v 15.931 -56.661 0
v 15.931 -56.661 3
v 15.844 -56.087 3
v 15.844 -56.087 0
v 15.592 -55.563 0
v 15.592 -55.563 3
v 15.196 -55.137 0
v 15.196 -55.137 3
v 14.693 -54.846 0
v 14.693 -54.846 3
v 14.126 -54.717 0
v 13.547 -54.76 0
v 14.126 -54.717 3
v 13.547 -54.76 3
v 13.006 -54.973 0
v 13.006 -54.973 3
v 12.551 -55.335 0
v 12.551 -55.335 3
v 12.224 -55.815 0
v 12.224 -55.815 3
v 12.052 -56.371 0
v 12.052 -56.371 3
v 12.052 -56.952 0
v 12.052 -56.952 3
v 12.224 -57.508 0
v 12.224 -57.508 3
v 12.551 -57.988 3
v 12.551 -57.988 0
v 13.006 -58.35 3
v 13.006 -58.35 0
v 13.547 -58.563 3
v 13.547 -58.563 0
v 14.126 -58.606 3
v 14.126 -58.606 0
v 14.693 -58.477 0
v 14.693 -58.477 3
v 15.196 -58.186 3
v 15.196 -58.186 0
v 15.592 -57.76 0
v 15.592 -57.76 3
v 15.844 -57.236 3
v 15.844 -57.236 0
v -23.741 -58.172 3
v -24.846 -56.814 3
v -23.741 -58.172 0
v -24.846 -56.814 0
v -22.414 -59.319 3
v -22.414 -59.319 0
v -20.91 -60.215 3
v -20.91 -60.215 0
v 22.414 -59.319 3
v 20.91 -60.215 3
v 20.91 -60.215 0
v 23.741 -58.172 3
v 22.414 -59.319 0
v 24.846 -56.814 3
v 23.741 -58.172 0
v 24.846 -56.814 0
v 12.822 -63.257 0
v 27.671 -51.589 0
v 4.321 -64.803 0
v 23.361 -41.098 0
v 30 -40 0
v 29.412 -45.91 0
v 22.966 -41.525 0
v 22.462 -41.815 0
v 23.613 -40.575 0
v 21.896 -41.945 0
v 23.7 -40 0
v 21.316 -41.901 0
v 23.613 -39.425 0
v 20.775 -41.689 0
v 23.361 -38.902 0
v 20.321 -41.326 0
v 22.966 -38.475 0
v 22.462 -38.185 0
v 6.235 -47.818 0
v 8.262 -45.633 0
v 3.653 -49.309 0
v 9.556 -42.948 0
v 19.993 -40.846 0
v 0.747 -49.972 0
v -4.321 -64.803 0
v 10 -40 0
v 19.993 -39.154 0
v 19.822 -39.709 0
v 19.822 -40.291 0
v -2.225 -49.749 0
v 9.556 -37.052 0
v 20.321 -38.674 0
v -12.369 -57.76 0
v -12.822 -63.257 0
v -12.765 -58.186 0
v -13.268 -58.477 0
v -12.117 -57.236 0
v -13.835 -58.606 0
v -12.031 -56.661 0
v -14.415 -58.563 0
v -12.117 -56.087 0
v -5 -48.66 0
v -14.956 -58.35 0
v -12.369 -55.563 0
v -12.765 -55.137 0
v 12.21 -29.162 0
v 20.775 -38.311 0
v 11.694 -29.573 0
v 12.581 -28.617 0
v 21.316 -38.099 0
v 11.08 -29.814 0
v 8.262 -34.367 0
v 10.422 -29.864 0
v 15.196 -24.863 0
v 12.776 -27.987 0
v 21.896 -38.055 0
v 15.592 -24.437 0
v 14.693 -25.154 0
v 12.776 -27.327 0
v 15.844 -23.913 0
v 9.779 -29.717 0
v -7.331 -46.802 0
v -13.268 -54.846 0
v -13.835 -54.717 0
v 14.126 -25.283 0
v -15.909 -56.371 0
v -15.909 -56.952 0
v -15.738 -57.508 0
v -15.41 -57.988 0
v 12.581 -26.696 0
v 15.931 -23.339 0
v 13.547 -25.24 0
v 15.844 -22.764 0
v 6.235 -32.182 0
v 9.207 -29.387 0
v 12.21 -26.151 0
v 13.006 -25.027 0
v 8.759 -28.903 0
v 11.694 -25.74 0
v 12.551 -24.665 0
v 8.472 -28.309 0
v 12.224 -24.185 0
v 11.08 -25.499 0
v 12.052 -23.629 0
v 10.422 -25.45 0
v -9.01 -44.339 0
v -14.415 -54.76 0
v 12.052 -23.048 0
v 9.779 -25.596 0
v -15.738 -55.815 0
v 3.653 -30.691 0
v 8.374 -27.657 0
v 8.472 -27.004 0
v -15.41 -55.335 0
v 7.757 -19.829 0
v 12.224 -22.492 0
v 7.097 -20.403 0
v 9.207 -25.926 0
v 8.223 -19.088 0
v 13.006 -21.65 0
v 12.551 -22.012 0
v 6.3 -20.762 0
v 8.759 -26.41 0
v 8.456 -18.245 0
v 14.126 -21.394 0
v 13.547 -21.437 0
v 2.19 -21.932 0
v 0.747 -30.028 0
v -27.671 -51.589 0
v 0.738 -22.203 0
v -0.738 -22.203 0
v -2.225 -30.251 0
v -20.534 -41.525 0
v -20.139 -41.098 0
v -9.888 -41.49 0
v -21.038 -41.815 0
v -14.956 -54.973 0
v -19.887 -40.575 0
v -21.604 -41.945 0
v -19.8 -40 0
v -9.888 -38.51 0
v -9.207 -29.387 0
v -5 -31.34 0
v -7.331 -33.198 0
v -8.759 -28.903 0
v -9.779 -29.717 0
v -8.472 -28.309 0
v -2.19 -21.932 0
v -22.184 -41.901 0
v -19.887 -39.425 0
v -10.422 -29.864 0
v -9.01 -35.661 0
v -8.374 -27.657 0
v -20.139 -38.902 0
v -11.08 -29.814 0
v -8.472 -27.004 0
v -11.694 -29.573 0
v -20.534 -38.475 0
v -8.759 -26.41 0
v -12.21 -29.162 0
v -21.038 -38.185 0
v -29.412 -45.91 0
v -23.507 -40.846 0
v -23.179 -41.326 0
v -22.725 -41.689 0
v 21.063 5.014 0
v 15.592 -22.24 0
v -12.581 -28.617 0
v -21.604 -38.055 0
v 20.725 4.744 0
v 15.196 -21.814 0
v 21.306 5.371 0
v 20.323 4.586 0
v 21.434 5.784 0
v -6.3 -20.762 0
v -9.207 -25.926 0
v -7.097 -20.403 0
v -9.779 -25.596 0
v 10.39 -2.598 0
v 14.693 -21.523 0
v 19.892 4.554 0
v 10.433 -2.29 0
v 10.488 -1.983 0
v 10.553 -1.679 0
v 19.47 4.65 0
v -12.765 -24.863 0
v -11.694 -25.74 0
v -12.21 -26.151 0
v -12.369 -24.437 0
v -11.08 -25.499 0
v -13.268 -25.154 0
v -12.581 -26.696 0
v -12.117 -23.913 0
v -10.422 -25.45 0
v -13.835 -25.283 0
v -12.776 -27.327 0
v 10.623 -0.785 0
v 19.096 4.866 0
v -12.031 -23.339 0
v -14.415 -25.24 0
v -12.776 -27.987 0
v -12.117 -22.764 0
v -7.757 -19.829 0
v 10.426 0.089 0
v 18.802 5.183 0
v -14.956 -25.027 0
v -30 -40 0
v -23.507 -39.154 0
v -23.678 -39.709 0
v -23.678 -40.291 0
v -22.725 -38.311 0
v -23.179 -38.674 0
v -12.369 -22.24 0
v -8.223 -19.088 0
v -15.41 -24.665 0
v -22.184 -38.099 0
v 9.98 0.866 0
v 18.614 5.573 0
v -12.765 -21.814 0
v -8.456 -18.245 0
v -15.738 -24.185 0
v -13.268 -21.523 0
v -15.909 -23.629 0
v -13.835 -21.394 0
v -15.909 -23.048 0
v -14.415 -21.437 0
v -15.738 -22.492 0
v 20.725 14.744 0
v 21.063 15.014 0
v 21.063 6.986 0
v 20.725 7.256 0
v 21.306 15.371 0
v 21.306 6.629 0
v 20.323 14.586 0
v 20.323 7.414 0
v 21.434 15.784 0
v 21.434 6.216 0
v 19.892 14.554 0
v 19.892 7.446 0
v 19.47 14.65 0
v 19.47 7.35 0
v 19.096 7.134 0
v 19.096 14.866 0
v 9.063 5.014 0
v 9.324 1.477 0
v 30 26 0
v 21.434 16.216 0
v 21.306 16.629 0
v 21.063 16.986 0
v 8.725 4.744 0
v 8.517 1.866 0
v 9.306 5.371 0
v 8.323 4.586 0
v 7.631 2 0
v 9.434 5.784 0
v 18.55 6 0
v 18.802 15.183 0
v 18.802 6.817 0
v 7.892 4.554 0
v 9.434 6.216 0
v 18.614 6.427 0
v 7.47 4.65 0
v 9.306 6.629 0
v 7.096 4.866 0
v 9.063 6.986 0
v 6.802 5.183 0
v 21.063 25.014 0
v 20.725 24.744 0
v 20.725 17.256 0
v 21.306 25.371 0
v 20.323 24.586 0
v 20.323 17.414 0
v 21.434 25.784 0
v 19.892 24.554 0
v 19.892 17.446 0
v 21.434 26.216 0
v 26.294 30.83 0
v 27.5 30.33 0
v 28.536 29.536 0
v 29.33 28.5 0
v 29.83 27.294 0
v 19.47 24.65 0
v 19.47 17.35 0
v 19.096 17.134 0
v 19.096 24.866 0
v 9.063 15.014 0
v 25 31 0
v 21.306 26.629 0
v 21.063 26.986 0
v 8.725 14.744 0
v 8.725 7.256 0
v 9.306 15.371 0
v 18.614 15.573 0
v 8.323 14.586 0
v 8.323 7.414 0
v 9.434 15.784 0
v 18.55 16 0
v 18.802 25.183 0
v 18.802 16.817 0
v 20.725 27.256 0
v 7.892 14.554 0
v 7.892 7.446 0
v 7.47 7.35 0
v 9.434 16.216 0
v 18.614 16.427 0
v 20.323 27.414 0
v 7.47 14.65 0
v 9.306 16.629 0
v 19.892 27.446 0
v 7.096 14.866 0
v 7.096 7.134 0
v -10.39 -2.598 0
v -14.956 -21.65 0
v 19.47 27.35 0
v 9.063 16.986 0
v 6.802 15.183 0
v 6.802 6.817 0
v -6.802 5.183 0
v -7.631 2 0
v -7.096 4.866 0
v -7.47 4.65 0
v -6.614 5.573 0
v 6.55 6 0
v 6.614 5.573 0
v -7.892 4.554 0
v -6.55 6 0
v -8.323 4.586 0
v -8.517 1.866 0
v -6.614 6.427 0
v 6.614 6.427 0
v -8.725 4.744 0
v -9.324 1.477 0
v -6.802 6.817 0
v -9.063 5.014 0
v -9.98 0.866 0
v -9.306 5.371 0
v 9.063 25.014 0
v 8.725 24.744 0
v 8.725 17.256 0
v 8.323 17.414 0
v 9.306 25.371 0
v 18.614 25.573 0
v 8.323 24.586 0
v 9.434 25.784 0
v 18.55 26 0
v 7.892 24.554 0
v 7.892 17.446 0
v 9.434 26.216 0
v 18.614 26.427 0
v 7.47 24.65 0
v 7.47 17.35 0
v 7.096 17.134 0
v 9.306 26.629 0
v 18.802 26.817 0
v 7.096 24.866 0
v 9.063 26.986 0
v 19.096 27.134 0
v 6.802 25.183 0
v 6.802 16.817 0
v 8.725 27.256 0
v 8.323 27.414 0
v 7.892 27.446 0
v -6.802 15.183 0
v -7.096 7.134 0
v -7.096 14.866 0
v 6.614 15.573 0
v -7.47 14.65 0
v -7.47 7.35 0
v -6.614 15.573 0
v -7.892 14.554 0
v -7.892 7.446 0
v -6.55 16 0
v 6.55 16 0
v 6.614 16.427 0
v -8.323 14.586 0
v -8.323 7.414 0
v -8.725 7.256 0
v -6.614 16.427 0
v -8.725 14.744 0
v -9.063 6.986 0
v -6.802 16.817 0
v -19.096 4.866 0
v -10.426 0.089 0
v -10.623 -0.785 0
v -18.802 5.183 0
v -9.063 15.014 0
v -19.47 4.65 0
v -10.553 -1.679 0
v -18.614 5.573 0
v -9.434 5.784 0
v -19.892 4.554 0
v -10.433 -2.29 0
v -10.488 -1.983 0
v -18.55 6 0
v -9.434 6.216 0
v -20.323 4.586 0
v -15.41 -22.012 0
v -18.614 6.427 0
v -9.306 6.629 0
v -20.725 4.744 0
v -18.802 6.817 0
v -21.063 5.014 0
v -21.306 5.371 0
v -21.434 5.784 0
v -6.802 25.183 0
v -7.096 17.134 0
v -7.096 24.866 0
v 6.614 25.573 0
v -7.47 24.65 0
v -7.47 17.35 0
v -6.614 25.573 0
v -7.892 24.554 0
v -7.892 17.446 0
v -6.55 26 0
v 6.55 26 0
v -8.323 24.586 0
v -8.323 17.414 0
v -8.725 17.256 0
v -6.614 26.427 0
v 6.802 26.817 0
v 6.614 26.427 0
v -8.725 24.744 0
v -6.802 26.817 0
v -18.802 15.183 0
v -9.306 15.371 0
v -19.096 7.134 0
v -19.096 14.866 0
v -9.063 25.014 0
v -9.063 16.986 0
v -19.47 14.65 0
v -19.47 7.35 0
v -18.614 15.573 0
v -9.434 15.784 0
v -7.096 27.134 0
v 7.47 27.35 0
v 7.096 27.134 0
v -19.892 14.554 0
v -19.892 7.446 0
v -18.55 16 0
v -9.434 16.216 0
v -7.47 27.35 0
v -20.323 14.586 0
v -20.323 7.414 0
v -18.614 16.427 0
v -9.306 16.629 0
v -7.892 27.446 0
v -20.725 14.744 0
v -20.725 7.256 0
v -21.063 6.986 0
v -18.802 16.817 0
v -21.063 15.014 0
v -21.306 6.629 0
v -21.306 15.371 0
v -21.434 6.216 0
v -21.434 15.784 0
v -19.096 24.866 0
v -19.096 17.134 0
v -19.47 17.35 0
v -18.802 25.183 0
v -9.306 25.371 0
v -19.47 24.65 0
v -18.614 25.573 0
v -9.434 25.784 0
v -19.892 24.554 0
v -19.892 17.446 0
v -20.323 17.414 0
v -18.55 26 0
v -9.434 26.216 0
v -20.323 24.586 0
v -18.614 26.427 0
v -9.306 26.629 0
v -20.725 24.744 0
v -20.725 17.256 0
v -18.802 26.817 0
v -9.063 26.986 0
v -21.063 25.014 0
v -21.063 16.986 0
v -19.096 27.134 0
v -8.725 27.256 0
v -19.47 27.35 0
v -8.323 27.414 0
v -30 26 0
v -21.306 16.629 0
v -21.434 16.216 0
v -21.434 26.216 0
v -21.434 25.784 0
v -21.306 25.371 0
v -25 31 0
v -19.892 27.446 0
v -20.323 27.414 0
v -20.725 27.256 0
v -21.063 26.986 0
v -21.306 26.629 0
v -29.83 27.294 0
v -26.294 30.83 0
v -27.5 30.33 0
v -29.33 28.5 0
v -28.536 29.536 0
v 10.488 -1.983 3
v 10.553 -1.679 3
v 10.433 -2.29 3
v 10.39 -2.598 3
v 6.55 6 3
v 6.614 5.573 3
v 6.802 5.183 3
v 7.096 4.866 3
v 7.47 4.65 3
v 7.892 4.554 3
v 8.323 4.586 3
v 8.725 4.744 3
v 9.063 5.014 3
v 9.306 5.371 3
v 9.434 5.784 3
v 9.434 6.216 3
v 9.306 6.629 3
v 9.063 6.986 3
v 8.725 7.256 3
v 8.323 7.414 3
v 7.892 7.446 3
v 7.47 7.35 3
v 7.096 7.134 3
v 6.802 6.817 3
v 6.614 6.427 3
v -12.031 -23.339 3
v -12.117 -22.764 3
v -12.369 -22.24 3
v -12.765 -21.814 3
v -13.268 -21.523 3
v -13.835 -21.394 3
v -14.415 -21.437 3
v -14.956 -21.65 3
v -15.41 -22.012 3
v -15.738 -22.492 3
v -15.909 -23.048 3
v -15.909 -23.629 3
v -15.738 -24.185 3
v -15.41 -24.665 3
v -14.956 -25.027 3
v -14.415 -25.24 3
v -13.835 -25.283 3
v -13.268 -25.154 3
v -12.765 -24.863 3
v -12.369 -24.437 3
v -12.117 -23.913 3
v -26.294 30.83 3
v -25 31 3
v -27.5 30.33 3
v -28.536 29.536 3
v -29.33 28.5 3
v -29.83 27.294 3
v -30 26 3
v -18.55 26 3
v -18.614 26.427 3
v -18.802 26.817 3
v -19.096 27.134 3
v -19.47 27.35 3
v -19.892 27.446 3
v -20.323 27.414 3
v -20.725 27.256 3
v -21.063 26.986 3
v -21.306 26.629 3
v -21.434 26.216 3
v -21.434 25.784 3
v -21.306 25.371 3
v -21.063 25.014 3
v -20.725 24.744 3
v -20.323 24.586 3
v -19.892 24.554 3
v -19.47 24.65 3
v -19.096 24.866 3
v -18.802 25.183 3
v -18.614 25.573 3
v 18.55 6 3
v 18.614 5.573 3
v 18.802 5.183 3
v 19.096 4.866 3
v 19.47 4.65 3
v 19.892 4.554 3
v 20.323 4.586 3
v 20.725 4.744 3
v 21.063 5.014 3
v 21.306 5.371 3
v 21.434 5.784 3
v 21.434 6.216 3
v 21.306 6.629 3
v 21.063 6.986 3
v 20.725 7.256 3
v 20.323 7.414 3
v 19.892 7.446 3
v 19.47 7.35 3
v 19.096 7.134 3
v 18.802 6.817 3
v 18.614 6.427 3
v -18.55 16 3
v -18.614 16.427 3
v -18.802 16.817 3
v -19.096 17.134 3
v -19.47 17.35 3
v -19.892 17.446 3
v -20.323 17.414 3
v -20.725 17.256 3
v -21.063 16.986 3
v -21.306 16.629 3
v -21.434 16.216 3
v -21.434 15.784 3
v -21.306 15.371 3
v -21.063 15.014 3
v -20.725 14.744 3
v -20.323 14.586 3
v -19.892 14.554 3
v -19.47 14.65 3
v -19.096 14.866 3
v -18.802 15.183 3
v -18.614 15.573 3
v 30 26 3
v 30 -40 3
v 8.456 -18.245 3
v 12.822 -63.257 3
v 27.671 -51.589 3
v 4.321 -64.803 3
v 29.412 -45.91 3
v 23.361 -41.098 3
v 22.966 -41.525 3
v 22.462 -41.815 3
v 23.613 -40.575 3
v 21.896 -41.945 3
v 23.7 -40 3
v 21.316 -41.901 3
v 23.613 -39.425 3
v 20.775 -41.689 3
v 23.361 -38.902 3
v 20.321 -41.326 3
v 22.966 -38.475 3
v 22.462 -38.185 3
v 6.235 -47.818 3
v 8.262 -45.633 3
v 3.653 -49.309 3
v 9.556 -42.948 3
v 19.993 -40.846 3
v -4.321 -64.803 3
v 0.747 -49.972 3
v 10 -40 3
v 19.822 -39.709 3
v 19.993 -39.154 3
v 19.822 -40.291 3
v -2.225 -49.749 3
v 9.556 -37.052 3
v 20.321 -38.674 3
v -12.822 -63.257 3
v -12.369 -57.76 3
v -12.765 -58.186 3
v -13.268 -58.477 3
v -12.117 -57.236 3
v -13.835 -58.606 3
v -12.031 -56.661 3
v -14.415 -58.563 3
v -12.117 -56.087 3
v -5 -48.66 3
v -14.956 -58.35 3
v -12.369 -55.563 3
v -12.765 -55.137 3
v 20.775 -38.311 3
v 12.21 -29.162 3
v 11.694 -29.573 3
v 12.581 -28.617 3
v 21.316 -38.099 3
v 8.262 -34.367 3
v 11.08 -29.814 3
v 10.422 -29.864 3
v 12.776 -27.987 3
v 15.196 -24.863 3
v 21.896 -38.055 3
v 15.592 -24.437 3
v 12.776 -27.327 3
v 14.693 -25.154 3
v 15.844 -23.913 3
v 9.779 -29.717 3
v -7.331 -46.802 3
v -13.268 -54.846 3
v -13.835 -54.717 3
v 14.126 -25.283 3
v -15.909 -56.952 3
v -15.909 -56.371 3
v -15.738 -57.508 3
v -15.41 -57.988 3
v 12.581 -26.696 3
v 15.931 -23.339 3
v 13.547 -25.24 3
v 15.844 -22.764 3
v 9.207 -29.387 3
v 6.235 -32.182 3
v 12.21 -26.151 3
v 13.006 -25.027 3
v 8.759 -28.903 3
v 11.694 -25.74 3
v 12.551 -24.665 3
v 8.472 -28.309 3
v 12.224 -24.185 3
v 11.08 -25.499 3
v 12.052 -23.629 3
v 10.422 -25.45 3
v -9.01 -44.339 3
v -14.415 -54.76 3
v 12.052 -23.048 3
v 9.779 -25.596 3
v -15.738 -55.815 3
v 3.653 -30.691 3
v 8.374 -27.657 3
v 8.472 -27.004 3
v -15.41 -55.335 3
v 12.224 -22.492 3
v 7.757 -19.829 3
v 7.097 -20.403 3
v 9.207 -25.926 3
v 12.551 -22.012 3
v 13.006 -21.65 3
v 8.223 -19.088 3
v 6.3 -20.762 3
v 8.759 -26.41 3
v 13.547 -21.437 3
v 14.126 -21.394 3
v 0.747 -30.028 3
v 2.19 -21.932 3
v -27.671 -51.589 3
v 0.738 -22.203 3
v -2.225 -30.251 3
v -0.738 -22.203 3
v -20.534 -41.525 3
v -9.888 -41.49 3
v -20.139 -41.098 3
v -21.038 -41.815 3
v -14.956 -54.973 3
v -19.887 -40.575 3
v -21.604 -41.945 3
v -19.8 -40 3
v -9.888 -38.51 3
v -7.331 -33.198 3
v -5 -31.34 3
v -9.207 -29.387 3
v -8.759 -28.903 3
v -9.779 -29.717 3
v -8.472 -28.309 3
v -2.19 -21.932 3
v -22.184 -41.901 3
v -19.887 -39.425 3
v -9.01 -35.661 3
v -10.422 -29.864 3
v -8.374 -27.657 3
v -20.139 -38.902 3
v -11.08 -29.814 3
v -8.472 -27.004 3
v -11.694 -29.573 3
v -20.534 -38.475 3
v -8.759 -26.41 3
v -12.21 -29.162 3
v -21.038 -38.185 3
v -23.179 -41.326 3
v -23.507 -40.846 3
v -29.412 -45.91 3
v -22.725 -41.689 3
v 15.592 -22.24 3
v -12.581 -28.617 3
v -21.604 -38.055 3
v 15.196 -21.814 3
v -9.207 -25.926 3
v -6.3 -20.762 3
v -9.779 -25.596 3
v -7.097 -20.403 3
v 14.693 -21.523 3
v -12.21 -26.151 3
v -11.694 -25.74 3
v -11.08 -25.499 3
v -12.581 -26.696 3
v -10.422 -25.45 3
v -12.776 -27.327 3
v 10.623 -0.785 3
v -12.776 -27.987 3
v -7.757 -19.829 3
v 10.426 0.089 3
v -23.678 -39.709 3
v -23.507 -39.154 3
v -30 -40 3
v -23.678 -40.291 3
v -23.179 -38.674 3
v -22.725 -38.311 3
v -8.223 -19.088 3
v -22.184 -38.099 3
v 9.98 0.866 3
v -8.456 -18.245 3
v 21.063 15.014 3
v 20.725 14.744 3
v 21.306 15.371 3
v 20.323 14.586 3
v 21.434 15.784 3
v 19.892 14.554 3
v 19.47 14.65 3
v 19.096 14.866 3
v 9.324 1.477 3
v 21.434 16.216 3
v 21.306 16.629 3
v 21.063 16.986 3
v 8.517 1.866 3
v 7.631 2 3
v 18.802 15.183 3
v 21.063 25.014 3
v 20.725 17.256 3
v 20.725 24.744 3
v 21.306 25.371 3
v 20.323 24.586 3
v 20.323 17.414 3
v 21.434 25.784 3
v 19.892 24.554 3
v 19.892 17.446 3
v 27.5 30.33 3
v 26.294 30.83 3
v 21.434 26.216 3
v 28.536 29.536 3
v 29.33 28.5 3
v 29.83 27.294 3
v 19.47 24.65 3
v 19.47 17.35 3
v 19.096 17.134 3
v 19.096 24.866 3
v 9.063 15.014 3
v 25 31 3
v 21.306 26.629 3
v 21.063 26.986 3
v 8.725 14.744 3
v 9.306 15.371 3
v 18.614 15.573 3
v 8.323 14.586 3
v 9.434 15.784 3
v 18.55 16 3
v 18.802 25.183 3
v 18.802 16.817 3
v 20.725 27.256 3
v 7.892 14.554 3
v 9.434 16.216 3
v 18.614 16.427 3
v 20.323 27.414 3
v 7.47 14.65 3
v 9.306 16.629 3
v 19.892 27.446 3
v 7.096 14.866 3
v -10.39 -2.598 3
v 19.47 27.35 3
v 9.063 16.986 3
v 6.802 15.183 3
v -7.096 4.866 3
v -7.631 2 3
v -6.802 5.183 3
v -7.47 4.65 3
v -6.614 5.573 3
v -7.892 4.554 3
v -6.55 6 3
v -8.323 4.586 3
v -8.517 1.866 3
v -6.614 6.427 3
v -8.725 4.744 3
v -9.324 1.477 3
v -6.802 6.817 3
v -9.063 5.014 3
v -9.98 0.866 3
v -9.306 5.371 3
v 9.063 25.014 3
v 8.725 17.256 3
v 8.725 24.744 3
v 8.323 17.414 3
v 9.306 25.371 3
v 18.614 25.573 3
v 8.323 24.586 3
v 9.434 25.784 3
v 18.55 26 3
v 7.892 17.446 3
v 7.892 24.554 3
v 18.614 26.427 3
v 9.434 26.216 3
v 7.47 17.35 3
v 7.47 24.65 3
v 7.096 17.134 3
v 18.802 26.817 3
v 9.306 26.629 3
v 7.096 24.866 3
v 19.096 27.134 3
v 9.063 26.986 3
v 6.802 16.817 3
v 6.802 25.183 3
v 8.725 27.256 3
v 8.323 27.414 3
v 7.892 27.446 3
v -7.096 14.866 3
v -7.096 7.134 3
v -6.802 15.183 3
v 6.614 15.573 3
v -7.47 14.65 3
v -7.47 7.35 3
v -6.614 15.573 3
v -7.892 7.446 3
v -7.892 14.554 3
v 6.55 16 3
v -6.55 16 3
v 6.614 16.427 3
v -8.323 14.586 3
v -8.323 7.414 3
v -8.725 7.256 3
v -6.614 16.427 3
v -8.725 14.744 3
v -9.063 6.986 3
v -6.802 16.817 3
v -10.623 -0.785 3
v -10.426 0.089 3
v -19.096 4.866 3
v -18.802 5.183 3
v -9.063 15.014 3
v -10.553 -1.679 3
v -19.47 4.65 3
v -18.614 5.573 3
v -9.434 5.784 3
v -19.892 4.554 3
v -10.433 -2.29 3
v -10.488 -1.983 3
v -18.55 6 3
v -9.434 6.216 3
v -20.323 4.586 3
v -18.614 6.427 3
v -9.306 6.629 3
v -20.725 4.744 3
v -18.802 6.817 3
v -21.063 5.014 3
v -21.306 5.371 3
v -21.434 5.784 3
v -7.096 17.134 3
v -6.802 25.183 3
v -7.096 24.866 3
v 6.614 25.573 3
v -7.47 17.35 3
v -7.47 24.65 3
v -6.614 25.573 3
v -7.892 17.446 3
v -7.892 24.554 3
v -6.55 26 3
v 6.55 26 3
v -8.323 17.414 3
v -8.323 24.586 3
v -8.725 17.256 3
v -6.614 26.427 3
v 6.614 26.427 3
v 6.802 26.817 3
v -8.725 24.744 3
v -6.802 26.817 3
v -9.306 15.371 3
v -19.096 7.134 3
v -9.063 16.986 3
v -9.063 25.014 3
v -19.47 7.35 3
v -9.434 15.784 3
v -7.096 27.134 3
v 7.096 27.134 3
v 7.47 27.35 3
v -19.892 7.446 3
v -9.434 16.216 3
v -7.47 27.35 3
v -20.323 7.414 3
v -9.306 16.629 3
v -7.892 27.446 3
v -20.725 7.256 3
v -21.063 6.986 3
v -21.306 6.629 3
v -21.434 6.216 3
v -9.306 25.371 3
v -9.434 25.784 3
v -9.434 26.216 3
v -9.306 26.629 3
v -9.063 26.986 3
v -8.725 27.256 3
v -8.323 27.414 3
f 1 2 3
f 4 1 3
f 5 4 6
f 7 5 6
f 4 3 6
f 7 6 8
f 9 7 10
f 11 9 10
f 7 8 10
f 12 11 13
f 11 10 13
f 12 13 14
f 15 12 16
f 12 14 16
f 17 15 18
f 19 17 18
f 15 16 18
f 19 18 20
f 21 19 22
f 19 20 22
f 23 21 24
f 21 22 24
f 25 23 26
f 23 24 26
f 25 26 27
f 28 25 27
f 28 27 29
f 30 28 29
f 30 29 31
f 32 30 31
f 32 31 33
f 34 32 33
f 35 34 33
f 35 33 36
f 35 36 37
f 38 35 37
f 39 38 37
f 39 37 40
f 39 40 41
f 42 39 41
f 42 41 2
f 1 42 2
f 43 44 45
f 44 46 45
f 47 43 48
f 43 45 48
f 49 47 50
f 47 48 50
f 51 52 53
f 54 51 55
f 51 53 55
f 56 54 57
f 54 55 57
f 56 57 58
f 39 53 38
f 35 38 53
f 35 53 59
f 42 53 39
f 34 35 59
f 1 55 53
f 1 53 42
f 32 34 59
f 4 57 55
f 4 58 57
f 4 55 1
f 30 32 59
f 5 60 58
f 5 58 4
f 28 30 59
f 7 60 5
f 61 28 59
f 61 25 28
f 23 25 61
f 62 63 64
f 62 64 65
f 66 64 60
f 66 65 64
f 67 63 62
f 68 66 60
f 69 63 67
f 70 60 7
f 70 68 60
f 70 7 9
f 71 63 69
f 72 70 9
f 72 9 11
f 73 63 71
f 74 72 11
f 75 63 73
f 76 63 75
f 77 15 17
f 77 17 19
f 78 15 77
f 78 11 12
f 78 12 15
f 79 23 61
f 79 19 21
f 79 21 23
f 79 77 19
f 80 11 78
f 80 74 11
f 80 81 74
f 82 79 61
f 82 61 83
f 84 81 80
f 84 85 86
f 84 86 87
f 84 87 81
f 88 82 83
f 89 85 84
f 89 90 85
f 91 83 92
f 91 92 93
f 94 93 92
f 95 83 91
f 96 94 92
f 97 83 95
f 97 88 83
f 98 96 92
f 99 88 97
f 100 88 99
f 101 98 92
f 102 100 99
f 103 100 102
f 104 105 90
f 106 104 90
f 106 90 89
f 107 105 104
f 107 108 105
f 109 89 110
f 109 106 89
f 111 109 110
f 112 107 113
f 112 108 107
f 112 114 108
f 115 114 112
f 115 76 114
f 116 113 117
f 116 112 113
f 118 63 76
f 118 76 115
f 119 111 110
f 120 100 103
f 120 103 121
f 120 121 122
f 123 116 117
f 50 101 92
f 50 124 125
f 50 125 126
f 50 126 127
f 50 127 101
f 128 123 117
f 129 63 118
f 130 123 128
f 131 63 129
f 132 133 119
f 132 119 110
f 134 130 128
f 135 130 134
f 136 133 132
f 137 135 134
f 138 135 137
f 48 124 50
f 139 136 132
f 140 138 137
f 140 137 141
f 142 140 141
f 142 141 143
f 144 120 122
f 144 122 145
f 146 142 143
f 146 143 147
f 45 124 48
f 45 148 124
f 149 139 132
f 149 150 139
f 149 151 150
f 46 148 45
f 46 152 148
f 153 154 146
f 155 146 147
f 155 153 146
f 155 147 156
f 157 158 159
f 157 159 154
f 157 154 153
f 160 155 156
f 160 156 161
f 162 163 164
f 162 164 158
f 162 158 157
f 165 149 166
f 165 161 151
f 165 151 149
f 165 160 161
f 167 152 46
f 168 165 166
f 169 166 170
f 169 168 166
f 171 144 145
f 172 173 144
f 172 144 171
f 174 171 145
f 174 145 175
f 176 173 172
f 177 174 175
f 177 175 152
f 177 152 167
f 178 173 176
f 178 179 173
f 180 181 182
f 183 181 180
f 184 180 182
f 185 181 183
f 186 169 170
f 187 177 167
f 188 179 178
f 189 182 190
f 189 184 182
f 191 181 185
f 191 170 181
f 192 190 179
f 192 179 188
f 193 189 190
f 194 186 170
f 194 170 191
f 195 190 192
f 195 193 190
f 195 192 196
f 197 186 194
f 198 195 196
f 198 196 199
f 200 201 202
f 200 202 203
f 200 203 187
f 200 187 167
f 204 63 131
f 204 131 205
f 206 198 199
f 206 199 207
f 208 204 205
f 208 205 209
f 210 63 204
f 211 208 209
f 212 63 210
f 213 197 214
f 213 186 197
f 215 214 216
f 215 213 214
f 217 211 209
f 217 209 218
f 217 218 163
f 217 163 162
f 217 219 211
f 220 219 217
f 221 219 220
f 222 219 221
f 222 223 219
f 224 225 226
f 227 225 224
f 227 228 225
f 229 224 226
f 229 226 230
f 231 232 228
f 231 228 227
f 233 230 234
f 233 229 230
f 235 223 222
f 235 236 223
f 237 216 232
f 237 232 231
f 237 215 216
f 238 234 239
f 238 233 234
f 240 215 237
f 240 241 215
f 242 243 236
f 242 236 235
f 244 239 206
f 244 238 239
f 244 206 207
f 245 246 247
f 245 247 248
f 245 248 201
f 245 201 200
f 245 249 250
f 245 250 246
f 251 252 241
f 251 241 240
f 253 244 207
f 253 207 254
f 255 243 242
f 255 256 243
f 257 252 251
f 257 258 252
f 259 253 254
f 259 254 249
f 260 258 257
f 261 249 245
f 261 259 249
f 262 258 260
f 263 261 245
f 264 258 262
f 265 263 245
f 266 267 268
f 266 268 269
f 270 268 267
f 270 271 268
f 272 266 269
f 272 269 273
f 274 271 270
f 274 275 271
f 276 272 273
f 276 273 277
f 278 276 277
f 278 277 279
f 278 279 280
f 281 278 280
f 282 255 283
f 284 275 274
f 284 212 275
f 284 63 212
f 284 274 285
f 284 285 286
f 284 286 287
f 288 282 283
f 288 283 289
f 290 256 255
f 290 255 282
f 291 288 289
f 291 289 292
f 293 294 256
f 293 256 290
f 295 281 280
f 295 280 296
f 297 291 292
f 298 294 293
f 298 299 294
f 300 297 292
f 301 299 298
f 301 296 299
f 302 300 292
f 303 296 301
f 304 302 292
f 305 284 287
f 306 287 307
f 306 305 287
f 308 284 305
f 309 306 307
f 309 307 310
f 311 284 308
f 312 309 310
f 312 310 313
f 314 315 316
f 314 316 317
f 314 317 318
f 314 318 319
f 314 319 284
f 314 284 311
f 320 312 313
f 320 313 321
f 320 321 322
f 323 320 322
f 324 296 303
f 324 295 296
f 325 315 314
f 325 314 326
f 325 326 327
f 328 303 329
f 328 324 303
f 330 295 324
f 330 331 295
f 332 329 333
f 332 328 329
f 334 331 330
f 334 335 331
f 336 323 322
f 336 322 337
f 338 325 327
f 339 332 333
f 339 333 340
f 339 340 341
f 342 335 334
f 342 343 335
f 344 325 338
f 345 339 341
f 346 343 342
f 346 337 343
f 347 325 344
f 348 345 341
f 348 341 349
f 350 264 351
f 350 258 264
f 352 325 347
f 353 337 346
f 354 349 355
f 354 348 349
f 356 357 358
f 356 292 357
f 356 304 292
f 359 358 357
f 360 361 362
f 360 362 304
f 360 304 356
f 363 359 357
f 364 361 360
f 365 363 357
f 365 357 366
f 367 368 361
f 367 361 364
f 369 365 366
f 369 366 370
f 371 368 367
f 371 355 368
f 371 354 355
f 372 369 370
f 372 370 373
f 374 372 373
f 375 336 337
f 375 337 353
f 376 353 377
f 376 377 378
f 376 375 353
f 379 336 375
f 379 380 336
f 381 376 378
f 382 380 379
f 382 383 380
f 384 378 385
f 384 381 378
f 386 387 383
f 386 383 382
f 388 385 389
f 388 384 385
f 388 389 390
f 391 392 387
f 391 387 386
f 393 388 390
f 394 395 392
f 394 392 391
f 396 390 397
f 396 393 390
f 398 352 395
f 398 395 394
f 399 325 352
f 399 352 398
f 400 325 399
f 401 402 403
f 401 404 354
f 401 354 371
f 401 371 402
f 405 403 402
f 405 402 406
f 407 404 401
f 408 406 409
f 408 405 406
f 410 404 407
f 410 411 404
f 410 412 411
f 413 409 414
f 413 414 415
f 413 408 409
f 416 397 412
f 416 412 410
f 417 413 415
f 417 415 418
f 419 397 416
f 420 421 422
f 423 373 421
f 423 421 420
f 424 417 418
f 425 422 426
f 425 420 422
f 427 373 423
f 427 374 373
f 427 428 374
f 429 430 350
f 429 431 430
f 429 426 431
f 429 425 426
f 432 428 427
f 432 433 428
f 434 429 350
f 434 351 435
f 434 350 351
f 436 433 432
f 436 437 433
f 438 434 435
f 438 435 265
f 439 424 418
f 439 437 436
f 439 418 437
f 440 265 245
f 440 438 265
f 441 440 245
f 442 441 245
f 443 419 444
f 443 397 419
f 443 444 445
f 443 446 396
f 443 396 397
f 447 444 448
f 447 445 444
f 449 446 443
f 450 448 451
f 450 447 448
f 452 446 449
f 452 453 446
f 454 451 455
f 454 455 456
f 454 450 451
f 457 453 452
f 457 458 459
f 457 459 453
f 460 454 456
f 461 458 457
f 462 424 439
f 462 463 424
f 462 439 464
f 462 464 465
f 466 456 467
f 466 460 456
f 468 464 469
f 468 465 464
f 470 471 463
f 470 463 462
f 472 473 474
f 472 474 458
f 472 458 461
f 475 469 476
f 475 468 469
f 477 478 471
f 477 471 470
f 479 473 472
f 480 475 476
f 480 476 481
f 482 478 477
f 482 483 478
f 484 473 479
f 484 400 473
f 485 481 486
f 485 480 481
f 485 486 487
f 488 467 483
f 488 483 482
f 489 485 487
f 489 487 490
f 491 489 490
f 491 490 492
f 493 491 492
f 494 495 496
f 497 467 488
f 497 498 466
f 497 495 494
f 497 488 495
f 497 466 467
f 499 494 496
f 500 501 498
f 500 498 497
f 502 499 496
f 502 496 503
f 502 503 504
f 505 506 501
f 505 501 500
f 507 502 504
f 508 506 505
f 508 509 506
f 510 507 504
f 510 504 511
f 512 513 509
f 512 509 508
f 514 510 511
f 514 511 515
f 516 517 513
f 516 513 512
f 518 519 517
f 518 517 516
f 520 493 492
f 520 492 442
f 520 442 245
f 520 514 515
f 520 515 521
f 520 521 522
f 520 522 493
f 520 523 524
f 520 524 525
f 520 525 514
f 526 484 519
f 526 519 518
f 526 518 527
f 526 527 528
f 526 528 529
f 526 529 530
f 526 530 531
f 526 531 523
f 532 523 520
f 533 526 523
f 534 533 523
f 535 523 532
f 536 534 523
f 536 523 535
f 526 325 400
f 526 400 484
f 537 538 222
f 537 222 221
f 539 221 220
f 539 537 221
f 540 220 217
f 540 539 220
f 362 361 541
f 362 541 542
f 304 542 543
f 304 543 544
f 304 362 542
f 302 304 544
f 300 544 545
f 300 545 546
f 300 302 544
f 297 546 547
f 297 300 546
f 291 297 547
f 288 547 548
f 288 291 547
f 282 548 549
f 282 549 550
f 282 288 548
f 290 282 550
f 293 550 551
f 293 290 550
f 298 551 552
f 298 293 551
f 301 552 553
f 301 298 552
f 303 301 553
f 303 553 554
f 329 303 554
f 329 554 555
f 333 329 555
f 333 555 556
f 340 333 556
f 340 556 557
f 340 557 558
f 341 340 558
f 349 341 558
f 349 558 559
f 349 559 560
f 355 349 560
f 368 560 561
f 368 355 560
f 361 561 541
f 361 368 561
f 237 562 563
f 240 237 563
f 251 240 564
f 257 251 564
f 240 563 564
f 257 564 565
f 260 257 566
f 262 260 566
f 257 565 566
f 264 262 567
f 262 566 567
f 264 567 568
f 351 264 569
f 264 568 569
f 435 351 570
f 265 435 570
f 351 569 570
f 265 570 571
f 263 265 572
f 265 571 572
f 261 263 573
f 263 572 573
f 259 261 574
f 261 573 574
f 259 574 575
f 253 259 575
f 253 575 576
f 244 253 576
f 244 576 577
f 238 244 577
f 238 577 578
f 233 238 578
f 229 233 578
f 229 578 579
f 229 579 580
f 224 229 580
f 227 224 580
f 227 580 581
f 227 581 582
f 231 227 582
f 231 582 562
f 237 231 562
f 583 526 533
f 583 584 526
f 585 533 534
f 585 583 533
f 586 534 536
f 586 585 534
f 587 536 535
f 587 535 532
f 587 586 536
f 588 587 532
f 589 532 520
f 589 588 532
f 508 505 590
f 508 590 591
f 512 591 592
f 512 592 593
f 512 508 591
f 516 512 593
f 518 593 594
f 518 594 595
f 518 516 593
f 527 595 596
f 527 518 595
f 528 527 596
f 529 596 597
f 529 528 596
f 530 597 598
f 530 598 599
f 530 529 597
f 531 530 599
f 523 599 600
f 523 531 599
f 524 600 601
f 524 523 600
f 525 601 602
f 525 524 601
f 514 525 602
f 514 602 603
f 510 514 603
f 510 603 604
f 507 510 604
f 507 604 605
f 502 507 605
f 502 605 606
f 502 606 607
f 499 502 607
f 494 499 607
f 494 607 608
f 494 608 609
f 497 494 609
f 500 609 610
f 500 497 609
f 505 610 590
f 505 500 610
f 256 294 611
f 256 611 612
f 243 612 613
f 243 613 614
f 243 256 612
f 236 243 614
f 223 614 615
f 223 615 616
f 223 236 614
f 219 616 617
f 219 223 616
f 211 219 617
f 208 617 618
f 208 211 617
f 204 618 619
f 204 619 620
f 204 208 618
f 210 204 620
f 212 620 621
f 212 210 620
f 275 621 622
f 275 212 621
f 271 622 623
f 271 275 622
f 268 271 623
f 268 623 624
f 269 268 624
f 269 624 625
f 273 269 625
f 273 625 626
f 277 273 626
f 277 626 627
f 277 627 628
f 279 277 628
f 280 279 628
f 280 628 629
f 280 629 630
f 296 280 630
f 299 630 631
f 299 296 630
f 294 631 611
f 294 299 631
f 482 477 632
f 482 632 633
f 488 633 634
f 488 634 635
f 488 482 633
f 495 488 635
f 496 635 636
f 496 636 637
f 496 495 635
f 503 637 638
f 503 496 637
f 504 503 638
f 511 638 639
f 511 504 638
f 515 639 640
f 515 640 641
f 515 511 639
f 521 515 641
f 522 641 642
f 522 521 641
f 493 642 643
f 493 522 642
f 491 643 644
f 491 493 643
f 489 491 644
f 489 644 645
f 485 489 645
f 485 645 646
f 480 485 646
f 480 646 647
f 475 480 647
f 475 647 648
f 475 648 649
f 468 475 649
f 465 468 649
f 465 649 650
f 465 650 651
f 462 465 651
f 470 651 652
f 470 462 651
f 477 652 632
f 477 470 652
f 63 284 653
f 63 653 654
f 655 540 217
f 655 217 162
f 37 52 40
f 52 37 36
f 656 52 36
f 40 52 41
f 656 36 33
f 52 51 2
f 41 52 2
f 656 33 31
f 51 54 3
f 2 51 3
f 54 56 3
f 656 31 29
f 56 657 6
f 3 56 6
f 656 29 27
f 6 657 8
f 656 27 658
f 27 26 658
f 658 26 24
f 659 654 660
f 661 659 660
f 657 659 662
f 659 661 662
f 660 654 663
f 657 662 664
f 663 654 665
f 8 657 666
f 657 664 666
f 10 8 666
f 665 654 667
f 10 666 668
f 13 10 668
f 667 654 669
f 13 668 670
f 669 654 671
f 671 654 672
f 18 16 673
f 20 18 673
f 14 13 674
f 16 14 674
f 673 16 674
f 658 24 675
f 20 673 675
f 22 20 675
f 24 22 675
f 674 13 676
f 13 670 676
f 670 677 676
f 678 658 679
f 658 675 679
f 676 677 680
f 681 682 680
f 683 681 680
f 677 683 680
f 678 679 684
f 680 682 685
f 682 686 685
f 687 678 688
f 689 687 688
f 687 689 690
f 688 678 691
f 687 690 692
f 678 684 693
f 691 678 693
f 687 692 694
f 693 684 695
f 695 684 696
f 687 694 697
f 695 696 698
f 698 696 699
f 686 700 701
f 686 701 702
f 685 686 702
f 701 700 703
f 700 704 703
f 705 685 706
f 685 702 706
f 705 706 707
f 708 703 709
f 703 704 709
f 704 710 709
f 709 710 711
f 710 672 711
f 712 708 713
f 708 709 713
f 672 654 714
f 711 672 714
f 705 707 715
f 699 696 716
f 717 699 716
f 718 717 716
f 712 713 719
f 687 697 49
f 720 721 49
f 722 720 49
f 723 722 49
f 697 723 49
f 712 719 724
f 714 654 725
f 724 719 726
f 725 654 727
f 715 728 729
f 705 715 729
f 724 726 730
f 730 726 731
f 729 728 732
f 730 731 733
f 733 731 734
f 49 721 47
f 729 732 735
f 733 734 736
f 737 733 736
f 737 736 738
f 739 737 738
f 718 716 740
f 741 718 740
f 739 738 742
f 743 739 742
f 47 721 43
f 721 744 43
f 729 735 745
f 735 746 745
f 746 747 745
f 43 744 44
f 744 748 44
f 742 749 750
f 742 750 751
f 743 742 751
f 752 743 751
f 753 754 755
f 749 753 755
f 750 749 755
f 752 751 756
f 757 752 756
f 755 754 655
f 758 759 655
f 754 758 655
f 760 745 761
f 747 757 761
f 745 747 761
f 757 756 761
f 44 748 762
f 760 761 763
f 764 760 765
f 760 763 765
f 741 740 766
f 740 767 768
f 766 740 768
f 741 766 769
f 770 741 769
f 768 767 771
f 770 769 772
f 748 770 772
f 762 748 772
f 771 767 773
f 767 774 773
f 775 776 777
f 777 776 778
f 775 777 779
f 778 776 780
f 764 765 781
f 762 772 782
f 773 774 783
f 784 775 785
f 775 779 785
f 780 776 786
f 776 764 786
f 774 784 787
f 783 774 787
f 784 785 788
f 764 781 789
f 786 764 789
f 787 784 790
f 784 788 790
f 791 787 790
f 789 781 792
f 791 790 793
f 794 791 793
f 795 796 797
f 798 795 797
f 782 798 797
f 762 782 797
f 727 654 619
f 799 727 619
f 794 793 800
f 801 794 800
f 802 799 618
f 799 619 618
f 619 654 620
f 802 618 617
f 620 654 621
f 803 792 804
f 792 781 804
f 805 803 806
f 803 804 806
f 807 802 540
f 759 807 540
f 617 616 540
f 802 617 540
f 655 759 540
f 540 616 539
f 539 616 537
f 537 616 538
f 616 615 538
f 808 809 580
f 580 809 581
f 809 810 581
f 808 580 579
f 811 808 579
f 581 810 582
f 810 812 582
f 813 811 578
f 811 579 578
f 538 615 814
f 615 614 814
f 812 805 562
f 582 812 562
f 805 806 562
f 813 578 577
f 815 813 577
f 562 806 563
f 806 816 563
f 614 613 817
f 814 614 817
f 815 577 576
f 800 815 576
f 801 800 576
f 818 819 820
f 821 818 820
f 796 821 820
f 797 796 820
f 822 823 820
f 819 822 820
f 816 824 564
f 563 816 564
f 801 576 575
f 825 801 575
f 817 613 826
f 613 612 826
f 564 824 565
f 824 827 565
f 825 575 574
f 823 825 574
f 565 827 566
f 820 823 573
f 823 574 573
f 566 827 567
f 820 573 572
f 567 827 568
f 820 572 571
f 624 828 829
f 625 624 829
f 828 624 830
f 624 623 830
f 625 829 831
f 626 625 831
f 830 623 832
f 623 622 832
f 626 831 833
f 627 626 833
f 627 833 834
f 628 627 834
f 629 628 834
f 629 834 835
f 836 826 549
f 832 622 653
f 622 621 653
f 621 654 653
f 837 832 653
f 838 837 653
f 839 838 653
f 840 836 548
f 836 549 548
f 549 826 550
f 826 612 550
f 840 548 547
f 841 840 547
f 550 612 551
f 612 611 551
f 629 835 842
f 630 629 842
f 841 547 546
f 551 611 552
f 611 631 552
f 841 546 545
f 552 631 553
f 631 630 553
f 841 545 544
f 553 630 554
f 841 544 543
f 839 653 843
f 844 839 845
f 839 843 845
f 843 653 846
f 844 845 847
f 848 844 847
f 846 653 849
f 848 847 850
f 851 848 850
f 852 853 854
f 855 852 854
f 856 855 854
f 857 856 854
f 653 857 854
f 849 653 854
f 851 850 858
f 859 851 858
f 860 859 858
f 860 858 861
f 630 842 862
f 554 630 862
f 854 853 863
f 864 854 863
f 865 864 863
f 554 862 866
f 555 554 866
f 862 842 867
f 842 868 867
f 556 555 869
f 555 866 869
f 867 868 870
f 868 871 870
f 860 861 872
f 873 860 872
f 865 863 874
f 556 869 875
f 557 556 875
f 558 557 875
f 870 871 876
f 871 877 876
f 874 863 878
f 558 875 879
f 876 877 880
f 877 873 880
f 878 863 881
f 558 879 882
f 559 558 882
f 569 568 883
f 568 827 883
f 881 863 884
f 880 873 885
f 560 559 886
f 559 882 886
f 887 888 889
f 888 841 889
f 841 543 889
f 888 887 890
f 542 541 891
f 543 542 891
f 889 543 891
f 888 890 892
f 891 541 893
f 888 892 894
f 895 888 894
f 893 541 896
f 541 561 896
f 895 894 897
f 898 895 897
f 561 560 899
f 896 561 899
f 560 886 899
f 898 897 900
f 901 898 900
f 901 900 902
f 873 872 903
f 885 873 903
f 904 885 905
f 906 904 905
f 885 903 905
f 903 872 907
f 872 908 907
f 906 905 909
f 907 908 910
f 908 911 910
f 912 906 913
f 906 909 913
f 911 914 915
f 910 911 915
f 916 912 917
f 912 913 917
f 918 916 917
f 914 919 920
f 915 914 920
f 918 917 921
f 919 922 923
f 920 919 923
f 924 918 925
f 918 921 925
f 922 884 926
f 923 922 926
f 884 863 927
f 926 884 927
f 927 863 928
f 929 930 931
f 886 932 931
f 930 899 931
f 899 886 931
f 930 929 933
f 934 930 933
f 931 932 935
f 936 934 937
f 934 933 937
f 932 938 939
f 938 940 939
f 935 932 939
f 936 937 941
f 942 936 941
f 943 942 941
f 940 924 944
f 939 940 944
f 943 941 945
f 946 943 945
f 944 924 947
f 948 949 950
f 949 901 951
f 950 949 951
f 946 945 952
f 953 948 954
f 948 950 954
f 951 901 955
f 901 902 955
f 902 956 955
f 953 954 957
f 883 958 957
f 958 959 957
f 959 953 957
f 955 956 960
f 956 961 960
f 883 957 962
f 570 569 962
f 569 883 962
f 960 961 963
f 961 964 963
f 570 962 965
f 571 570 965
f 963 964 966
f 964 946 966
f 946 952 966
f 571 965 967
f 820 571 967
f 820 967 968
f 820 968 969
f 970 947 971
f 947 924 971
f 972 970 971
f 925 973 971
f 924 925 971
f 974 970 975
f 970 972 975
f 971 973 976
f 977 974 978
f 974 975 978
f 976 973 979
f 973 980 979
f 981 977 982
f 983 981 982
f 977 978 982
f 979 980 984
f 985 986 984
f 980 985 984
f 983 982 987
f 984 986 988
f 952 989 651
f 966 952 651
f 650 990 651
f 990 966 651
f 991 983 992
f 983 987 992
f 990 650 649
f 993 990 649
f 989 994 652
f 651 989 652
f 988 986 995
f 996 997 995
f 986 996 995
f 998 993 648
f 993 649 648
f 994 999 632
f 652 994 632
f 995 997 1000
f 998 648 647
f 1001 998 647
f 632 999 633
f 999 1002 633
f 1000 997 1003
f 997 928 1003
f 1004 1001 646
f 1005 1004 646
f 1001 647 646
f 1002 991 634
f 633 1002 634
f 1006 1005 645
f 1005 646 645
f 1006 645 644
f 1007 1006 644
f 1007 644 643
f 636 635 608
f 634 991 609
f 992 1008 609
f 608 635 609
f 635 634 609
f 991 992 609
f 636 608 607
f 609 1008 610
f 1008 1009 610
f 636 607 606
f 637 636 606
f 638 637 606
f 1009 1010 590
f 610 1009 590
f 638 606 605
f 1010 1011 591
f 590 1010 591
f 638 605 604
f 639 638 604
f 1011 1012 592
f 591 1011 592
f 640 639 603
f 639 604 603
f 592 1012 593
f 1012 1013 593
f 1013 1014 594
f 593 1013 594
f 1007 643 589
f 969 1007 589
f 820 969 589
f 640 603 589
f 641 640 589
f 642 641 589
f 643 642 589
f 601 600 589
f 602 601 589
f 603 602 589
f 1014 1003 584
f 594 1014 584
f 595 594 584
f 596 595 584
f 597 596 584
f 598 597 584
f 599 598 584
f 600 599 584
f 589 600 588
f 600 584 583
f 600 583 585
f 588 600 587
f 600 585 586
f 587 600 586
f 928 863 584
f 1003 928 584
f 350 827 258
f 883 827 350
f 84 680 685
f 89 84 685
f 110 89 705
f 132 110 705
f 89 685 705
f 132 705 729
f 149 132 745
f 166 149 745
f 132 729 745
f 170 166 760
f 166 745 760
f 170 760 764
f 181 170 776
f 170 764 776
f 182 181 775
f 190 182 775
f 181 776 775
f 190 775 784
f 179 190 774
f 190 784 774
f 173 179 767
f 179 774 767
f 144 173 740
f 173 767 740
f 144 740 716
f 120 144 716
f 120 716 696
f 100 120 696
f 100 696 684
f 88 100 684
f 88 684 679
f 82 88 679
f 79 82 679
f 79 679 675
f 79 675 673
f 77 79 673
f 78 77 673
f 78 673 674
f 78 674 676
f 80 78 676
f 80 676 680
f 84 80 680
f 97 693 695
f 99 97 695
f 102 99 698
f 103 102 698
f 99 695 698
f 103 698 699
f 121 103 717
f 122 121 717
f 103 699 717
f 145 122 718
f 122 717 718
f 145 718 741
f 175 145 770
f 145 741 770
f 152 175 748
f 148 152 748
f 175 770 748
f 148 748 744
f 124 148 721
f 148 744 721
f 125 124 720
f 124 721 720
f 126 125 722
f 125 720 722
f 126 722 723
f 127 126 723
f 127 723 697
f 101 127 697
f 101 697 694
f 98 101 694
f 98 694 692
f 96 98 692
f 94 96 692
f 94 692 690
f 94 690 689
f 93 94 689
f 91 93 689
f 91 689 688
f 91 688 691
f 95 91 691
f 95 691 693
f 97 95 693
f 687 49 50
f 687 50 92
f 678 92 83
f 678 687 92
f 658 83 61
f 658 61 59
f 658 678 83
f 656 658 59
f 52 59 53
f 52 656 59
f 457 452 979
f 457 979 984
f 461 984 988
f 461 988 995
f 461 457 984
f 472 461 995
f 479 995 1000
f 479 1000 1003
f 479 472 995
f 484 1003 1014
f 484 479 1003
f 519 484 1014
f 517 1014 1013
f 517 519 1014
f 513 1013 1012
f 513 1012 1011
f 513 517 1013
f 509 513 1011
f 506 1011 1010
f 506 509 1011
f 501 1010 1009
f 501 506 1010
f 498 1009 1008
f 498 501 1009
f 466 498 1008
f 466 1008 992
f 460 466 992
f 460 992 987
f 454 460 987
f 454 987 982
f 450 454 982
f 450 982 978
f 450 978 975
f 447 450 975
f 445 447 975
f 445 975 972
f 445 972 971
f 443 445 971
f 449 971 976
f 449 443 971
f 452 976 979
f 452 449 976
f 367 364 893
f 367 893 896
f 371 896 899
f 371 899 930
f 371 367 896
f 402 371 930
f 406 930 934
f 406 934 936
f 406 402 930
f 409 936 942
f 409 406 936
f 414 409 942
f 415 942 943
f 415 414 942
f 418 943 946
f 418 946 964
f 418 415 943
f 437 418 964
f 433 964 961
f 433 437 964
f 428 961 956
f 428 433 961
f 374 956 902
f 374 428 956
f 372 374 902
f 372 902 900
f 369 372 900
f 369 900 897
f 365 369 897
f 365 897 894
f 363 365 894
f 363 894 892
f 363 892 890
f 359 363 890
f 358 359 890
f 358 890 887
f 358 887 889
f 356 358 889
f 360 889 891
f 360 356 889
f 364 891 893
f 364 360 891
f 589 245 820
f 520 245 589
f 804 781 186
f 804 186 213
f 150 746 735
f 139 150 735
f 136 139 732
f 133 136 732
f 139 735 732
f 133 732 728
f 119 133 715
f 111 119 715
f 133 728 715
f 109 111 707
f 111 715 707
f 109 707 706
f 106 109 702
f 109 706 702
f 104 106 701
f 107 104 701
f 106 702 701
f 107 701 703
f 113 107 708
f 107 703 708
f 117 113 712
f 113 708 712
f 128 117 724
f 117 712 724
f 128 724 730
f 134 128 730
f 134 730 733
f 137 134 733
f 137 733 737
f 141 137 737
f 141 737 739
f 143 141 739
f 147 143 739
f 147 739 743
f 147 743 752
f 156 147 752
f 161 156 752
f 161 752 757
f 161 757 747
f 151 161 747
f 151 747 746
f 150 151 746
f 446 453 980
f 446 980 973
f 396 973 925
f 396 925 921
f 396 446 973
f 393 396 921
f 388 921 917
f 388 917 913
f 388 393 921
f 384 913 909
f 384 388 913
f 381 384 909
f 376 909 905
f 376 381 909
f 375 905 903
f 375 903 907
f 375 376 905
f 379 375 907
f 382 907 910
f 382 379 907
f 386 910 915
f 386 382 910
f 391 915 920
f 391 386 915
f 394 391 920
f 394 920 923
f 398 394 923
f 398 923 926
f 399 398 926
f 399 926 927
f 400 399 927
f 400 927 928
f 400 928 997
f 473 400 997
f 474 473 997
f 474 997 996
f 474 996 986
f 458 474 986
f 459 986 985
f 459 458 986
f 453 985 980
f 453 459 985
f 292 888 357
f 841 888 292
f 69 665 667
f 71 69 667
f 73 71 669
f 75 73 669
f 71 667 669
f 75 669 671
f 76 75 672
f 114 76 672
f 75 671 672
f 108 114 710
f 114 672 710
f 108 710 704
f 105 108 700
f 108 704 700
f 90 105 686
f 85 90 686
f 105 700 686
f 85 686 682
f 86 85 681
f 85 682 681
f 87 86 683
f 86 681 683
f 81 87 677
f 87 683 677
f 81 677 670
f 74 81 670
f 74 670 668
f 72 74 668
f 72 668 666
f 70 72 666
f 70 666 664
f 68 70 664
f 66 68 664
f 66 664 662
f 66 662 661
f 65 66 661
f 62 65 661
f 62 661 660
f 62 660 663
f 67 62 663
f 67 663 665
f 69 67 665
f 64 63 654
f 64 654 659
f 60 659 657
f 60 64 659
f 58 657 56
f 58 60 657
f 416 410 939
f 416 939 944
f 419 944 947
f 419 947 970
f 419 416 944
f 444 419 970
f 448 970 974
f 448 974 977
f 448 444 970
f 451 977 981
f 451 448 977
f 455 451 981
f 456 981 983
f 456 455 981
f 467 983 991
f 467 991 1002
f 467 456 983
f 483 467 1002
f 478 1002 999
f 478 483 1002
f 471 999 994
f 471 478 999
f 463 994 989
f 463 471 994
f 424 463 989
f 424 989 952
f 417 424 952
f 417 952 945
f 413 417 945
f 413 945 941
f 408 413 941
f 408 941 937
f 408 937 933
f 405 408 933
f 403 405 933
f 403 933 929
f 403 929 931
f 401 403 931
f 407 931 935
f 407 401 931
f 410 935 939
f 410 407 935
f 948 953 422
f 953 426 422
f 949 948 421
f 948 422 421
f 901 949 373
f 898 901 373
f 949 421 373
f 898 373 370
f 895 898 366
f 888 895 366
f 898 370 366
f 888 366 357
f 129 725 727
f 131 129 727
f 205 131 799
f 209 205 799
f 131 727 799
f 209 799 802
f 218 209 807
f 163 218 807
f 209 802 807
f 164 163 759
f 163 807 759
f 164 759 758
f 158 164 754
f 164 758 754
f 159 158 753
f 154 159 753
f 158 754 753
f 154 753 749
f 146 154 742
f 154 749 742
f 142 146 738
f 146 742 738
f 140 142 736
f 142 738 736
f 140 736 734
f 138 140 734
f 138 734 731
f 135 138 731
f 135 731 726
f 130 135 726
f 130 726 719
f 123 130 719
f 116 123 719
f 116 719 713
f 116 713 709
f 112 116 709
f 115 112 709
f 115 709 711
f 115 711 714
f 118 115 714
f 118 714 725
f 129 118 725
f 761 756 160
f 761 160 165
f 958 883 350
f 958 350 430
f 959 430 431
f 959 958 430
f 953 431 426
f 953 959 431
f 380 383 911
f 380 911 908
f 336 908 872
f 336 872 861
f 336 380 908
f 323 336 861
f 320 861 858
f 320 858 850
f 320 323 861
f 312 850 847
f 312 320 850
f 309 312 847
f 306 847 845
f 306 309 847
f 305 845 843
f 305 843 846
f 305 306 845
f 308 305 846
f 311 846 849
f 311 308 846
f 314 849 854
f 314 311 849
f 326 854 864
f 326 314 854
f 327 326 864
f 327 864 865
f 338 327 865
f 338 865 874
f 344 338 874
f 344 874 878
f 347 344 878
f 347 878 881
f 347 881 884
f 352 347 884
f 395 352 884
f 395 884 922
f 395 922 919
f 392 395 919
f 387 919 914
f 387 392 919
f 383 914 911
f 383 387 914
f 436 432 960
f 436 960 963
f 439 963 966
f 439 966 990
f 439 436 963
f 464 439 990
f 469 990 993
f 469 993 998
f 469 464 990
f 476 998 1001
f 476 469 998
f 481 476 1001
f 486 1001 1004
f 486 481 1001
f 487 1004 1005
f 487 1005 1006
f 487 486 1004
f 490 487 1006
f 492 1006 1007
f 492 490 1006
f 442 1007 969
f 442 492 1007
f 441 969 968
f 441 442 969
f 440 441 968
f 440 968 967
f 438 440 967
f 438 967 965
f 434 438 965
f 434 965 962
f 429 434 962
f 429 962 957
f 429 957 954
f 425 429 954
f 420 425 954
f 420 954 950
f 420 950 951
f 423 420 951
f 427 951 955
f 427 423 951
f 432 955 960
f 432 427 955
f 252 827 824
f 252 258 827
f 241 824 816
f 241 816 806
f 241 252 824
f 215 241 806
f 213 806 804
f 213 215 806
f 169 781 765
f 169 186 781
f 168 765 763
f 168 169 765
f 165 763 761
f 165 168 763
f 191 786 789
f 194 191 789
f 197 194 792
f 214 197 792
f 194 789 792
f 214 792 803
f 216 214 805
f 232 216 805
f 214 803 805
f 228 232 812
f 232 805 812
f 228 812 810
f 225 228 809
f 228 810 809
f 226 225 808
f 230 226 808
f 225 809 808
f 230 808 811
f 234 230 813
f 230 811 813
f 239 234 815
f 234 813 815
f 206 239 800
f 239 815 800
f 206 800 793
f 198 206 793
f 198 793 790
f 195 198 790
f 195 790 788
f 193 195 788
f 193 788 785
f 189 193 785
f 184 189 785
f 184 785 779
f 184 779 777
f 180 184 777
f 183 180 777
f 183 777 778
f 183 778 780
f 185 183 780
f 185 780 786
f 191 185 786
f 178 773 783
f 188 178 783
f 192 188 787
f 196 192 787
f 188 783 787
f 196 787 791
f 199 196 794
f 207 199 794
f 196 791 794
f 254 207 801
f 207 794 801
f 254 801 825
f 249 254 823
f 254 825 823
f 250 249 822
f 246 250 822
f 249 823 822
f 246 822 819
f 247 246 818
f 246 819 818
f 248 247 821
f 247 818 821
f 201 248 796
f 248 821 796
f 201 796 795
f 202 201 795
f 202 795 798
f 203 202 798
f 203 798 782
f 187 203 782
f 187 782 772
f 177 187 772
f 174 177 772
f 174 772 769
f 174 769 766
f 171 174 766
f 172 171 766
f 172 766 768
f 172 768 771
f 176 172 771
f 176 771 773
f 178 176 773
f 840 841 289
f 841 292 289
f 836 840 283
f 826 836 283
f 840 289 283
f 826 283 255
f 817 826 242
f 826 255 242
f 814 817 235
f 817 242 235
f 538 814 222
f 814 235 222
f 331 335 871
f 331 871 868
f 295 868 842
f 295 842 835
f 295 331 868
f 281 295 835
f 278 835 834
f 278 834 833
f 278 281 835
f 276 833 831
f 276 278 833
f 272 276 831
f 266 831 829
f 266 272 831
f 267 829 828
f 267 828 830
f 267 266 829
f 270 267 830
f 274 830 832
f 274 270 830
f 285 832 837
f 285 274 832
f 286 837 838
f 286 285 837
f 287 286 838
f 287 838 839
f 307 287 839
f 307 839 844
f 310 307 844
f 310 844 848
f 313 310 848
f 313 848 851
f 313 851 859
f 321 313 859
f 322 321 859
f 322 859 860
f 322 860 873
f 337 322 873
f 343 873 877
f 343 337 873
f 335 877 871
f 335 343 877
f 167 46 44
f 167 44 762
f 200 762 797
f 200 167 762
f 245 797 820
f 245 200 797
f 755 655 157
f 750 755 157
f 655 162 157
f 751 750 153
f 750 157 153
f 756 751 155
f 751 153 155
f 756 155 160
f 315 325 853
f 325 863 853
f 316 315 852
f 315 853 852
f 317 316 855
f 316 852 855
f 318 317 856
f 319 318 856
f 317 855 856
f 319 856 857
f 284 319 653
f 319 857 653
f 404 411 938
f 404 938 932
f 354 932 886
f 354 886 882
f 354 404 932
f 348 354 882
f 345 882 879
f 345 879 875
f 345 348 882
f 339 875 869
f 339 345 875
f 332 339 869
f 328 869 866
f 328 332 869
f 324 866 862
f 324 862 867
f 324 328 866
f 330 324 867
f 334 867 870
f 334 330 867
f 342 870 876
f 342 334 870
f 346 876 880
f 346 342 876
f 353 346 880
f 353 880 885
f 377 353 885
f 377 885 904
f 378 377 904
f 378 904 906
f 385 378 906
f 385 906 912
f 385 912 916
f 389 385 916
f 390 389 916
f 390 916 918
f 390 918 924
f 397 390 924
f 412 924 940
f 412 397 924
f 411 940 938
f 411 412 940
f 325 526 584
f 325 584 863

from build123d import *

# Parameters (mm, degrees)
SKETCH_1_R          = 1.45
EXTRUDE_1_DEPTH     = 3
SKETCH_3_R          = 1.95
CUT_EXTRUDE_2_DEPTH = 77.216796049
FILLET_1_R          = 5
SKETCH_4_R          = 10
CUT_EXTRUDE_3_DEPTH = 77.216796049
SKETCH_5_R          = 2.213245743
CUT_EXTRUDE_4_DEPTH = 77.216796049
FILLET_2_R          = 10
FILLET_3_R          = 3
FILLET_4_R          = 8


with BuildPart() as part:
    # 草图1 → 凸台-拉伸1 (new body)
    with BuildSketch(Plane.XY):
        with BuildLine():
            Line((-30, 31), (30, 31))
            Line((30, 31), (30, -40))
            ThreePointArc((30, -40), (0, -70), (-30, -40))
            Line((-30, -40), (-30, 31))
        make_face()
        with Locations((-20, 26)):
            Circle(SKETCH_1_R, mode=Mode.SUBTRACT)
        with Locations((-20, 16)):
            Circle(SKETCH_1_R, mode=Mode.SUBTRACT)
        with Locations((-20, 6)):
            Circle(SKETCH_1_R, mode=Mode.SUBTRACT)
        with Locations((-8, 26)):
            Circle(SKETCH_1_R, mode=Mode.SUBTRACT)
        with Locations((-8, 16)):
            Circle(SKETCH_1_R, mode=Mode.SUBTRACT)
        with Locations((-8, 6)):
            Circle(SKETCH_1_R, mode=Mode.SUBTRACT)
        with Locations(Location((8, 6, 0), (0, 0, 180))):
            Circle(SKETCH_1_R, mode=Mode.SUBTRACT)
        with Locations(Location((8, 16, 0), (0, 0, 180))):
            Circle(SKETCH_1_R, mode=Mode.SUBTRACT)
        with Locations(Location((8, 26, 0), (0, 0, 180))):
            Circle(SKETCH_1_R, mode=Mode.SUBTRACT)
        with Locations(Location((20, 6, 0), (0, 0, 180))):
            Circle(SKETCH_1_R, mode=Mode.SUBTRACT)
        with Locations(Location((20, 16, 0), (0, 0, 180))):
            Circle(SKETCH_1_R, mode=Mode.SUBTRACT)
        with Locations(Location((20, 26, 0), (0, 0, 180))):
            Circle(SKETCH_1_R, mode=Mode.SUBTRACT)
    extrude(amount=EXTRUDE_1_DEPTH)

    # 草图3 → 切除-拉伸2 (cut, through all)
    with BuildSketch(Plane.XY.offset(3)):
        with Locations((-21.75, -40)):
            Circle(SKETCH_3_R)
        with Locations((-13.980630511, -23.338533362)):
            Circle(SKETCH_3_R)
        with Locations((-13.980630511, -56.661466638)):
            Circle(SKETCH_3_R)
        with Locations((21.75, -40)):
            Circle(SKETCH_3_R)
        with Locations((13.980630511, -23.338533362)):
            Circle(SKETCH_3_R)
        with Locations((13.980630511, -56.661466638)):
            Circle(SKETCH_3_R)
    extrude(amount=-CUT_EXTRUDE_2_DEPTH, mode=Mode.SUBTRACT)

    # 圆角1
    fillet_1_edges = [part.edges().sort_by_distance(p)[0] for p in [
        (-30, 31, 1.5),
        (30, 31, 1.5),
    ]]
    fillet(fillet_1_edges, radius=FILLET_1_R)

    # 草图4 → 切除-拉伸3 (cut, through all)
    with BuildSketch(Plane.XY.offset(3)):
        with Locations((0, -40)):
            Circle(SKETCH_4_R)
    extrude(amount=-CUT_EXTRUDE_3_DEPTH, mode=Mode.SUBTRACT)

    # 草图5 → 切除-拉伸4 (cut, through all)
    with BuildSketch(Plane.XY.offset(3)):
        with Locations((-10.587343504, -27.656694111)):
            Circle(SKETCH_5_R)
        with Locations(Location((10.587343504, -27.656694111, 0), (0, 0, 180))):
            Circle(SKETCH_5_R)
        with BuildLine():
            Line((0, -22.555255147), (-8.212014753, -20.218285546))
            Line((-8.212014753, -20.218285546), (-10.389846713, -2.597786896))
            ThreePointArc((-10.389846713, -2.597786896), (-11.055900559, -0.155034313), (-12.38499612, 2))
            Line((-12.38499612, 2), (12.38499612, 2))
            ThreePointArc((12.38499612, 2), (11.055900559, -0.155034313), (10.389846713, -2.597786896))
            Line((10.389846713, -2.597786896), (8.212014753, -20.218285546))
            Line((8.212014753, -20.218285546), (0, -22.555255147))
        make_face()
        with BuildLine():
            ThreePointArc((-23.179978152, -59.044385338), (0, -64.997150083), (23.179978152, -59.044385338))
            ThreePointArc((23.179978152, -59.044385338), (0, -70), (-23.179978152, -59.044385338))
        make_face()
    extrude(amount=-CUT_EXTRUDE_4_DEPTH, mode=Mode.SUBTRACT)

    # 圆角2
    fillet_2_edges = [part.edges().sort_by_distance(p)[0] for p in [
        (23.179978152, -59.044385338, 1.5),
        (-23.179978152, -59.044385338, 1.5),
    ]]
    fillet(fillet_2_edges, radius=FILLET_2_R)

    # 圆角3
    fillet_3_edges = [part.edges().sort_by_distance(p)[0] for p in [
        (8.212014753, -20.218285546, 1.5),
        (-8.212014753, -20.218285546, 1.5),
        (-12.38499612, 2, 1.5),
        (12.38499612, 2, 1.5),
    ]]
    fillet(fillet_3_edges, radius=FILLET_3_R)

    # 圆角4
    fillet_4_edges = [part.edges().sort_by_distance(p)[0] for p in [
        (0, -22.555255147, 1.5),
    ]]
    fillet(fillet_4_edges, radius=FILLET_4_R)


solid = part.part
